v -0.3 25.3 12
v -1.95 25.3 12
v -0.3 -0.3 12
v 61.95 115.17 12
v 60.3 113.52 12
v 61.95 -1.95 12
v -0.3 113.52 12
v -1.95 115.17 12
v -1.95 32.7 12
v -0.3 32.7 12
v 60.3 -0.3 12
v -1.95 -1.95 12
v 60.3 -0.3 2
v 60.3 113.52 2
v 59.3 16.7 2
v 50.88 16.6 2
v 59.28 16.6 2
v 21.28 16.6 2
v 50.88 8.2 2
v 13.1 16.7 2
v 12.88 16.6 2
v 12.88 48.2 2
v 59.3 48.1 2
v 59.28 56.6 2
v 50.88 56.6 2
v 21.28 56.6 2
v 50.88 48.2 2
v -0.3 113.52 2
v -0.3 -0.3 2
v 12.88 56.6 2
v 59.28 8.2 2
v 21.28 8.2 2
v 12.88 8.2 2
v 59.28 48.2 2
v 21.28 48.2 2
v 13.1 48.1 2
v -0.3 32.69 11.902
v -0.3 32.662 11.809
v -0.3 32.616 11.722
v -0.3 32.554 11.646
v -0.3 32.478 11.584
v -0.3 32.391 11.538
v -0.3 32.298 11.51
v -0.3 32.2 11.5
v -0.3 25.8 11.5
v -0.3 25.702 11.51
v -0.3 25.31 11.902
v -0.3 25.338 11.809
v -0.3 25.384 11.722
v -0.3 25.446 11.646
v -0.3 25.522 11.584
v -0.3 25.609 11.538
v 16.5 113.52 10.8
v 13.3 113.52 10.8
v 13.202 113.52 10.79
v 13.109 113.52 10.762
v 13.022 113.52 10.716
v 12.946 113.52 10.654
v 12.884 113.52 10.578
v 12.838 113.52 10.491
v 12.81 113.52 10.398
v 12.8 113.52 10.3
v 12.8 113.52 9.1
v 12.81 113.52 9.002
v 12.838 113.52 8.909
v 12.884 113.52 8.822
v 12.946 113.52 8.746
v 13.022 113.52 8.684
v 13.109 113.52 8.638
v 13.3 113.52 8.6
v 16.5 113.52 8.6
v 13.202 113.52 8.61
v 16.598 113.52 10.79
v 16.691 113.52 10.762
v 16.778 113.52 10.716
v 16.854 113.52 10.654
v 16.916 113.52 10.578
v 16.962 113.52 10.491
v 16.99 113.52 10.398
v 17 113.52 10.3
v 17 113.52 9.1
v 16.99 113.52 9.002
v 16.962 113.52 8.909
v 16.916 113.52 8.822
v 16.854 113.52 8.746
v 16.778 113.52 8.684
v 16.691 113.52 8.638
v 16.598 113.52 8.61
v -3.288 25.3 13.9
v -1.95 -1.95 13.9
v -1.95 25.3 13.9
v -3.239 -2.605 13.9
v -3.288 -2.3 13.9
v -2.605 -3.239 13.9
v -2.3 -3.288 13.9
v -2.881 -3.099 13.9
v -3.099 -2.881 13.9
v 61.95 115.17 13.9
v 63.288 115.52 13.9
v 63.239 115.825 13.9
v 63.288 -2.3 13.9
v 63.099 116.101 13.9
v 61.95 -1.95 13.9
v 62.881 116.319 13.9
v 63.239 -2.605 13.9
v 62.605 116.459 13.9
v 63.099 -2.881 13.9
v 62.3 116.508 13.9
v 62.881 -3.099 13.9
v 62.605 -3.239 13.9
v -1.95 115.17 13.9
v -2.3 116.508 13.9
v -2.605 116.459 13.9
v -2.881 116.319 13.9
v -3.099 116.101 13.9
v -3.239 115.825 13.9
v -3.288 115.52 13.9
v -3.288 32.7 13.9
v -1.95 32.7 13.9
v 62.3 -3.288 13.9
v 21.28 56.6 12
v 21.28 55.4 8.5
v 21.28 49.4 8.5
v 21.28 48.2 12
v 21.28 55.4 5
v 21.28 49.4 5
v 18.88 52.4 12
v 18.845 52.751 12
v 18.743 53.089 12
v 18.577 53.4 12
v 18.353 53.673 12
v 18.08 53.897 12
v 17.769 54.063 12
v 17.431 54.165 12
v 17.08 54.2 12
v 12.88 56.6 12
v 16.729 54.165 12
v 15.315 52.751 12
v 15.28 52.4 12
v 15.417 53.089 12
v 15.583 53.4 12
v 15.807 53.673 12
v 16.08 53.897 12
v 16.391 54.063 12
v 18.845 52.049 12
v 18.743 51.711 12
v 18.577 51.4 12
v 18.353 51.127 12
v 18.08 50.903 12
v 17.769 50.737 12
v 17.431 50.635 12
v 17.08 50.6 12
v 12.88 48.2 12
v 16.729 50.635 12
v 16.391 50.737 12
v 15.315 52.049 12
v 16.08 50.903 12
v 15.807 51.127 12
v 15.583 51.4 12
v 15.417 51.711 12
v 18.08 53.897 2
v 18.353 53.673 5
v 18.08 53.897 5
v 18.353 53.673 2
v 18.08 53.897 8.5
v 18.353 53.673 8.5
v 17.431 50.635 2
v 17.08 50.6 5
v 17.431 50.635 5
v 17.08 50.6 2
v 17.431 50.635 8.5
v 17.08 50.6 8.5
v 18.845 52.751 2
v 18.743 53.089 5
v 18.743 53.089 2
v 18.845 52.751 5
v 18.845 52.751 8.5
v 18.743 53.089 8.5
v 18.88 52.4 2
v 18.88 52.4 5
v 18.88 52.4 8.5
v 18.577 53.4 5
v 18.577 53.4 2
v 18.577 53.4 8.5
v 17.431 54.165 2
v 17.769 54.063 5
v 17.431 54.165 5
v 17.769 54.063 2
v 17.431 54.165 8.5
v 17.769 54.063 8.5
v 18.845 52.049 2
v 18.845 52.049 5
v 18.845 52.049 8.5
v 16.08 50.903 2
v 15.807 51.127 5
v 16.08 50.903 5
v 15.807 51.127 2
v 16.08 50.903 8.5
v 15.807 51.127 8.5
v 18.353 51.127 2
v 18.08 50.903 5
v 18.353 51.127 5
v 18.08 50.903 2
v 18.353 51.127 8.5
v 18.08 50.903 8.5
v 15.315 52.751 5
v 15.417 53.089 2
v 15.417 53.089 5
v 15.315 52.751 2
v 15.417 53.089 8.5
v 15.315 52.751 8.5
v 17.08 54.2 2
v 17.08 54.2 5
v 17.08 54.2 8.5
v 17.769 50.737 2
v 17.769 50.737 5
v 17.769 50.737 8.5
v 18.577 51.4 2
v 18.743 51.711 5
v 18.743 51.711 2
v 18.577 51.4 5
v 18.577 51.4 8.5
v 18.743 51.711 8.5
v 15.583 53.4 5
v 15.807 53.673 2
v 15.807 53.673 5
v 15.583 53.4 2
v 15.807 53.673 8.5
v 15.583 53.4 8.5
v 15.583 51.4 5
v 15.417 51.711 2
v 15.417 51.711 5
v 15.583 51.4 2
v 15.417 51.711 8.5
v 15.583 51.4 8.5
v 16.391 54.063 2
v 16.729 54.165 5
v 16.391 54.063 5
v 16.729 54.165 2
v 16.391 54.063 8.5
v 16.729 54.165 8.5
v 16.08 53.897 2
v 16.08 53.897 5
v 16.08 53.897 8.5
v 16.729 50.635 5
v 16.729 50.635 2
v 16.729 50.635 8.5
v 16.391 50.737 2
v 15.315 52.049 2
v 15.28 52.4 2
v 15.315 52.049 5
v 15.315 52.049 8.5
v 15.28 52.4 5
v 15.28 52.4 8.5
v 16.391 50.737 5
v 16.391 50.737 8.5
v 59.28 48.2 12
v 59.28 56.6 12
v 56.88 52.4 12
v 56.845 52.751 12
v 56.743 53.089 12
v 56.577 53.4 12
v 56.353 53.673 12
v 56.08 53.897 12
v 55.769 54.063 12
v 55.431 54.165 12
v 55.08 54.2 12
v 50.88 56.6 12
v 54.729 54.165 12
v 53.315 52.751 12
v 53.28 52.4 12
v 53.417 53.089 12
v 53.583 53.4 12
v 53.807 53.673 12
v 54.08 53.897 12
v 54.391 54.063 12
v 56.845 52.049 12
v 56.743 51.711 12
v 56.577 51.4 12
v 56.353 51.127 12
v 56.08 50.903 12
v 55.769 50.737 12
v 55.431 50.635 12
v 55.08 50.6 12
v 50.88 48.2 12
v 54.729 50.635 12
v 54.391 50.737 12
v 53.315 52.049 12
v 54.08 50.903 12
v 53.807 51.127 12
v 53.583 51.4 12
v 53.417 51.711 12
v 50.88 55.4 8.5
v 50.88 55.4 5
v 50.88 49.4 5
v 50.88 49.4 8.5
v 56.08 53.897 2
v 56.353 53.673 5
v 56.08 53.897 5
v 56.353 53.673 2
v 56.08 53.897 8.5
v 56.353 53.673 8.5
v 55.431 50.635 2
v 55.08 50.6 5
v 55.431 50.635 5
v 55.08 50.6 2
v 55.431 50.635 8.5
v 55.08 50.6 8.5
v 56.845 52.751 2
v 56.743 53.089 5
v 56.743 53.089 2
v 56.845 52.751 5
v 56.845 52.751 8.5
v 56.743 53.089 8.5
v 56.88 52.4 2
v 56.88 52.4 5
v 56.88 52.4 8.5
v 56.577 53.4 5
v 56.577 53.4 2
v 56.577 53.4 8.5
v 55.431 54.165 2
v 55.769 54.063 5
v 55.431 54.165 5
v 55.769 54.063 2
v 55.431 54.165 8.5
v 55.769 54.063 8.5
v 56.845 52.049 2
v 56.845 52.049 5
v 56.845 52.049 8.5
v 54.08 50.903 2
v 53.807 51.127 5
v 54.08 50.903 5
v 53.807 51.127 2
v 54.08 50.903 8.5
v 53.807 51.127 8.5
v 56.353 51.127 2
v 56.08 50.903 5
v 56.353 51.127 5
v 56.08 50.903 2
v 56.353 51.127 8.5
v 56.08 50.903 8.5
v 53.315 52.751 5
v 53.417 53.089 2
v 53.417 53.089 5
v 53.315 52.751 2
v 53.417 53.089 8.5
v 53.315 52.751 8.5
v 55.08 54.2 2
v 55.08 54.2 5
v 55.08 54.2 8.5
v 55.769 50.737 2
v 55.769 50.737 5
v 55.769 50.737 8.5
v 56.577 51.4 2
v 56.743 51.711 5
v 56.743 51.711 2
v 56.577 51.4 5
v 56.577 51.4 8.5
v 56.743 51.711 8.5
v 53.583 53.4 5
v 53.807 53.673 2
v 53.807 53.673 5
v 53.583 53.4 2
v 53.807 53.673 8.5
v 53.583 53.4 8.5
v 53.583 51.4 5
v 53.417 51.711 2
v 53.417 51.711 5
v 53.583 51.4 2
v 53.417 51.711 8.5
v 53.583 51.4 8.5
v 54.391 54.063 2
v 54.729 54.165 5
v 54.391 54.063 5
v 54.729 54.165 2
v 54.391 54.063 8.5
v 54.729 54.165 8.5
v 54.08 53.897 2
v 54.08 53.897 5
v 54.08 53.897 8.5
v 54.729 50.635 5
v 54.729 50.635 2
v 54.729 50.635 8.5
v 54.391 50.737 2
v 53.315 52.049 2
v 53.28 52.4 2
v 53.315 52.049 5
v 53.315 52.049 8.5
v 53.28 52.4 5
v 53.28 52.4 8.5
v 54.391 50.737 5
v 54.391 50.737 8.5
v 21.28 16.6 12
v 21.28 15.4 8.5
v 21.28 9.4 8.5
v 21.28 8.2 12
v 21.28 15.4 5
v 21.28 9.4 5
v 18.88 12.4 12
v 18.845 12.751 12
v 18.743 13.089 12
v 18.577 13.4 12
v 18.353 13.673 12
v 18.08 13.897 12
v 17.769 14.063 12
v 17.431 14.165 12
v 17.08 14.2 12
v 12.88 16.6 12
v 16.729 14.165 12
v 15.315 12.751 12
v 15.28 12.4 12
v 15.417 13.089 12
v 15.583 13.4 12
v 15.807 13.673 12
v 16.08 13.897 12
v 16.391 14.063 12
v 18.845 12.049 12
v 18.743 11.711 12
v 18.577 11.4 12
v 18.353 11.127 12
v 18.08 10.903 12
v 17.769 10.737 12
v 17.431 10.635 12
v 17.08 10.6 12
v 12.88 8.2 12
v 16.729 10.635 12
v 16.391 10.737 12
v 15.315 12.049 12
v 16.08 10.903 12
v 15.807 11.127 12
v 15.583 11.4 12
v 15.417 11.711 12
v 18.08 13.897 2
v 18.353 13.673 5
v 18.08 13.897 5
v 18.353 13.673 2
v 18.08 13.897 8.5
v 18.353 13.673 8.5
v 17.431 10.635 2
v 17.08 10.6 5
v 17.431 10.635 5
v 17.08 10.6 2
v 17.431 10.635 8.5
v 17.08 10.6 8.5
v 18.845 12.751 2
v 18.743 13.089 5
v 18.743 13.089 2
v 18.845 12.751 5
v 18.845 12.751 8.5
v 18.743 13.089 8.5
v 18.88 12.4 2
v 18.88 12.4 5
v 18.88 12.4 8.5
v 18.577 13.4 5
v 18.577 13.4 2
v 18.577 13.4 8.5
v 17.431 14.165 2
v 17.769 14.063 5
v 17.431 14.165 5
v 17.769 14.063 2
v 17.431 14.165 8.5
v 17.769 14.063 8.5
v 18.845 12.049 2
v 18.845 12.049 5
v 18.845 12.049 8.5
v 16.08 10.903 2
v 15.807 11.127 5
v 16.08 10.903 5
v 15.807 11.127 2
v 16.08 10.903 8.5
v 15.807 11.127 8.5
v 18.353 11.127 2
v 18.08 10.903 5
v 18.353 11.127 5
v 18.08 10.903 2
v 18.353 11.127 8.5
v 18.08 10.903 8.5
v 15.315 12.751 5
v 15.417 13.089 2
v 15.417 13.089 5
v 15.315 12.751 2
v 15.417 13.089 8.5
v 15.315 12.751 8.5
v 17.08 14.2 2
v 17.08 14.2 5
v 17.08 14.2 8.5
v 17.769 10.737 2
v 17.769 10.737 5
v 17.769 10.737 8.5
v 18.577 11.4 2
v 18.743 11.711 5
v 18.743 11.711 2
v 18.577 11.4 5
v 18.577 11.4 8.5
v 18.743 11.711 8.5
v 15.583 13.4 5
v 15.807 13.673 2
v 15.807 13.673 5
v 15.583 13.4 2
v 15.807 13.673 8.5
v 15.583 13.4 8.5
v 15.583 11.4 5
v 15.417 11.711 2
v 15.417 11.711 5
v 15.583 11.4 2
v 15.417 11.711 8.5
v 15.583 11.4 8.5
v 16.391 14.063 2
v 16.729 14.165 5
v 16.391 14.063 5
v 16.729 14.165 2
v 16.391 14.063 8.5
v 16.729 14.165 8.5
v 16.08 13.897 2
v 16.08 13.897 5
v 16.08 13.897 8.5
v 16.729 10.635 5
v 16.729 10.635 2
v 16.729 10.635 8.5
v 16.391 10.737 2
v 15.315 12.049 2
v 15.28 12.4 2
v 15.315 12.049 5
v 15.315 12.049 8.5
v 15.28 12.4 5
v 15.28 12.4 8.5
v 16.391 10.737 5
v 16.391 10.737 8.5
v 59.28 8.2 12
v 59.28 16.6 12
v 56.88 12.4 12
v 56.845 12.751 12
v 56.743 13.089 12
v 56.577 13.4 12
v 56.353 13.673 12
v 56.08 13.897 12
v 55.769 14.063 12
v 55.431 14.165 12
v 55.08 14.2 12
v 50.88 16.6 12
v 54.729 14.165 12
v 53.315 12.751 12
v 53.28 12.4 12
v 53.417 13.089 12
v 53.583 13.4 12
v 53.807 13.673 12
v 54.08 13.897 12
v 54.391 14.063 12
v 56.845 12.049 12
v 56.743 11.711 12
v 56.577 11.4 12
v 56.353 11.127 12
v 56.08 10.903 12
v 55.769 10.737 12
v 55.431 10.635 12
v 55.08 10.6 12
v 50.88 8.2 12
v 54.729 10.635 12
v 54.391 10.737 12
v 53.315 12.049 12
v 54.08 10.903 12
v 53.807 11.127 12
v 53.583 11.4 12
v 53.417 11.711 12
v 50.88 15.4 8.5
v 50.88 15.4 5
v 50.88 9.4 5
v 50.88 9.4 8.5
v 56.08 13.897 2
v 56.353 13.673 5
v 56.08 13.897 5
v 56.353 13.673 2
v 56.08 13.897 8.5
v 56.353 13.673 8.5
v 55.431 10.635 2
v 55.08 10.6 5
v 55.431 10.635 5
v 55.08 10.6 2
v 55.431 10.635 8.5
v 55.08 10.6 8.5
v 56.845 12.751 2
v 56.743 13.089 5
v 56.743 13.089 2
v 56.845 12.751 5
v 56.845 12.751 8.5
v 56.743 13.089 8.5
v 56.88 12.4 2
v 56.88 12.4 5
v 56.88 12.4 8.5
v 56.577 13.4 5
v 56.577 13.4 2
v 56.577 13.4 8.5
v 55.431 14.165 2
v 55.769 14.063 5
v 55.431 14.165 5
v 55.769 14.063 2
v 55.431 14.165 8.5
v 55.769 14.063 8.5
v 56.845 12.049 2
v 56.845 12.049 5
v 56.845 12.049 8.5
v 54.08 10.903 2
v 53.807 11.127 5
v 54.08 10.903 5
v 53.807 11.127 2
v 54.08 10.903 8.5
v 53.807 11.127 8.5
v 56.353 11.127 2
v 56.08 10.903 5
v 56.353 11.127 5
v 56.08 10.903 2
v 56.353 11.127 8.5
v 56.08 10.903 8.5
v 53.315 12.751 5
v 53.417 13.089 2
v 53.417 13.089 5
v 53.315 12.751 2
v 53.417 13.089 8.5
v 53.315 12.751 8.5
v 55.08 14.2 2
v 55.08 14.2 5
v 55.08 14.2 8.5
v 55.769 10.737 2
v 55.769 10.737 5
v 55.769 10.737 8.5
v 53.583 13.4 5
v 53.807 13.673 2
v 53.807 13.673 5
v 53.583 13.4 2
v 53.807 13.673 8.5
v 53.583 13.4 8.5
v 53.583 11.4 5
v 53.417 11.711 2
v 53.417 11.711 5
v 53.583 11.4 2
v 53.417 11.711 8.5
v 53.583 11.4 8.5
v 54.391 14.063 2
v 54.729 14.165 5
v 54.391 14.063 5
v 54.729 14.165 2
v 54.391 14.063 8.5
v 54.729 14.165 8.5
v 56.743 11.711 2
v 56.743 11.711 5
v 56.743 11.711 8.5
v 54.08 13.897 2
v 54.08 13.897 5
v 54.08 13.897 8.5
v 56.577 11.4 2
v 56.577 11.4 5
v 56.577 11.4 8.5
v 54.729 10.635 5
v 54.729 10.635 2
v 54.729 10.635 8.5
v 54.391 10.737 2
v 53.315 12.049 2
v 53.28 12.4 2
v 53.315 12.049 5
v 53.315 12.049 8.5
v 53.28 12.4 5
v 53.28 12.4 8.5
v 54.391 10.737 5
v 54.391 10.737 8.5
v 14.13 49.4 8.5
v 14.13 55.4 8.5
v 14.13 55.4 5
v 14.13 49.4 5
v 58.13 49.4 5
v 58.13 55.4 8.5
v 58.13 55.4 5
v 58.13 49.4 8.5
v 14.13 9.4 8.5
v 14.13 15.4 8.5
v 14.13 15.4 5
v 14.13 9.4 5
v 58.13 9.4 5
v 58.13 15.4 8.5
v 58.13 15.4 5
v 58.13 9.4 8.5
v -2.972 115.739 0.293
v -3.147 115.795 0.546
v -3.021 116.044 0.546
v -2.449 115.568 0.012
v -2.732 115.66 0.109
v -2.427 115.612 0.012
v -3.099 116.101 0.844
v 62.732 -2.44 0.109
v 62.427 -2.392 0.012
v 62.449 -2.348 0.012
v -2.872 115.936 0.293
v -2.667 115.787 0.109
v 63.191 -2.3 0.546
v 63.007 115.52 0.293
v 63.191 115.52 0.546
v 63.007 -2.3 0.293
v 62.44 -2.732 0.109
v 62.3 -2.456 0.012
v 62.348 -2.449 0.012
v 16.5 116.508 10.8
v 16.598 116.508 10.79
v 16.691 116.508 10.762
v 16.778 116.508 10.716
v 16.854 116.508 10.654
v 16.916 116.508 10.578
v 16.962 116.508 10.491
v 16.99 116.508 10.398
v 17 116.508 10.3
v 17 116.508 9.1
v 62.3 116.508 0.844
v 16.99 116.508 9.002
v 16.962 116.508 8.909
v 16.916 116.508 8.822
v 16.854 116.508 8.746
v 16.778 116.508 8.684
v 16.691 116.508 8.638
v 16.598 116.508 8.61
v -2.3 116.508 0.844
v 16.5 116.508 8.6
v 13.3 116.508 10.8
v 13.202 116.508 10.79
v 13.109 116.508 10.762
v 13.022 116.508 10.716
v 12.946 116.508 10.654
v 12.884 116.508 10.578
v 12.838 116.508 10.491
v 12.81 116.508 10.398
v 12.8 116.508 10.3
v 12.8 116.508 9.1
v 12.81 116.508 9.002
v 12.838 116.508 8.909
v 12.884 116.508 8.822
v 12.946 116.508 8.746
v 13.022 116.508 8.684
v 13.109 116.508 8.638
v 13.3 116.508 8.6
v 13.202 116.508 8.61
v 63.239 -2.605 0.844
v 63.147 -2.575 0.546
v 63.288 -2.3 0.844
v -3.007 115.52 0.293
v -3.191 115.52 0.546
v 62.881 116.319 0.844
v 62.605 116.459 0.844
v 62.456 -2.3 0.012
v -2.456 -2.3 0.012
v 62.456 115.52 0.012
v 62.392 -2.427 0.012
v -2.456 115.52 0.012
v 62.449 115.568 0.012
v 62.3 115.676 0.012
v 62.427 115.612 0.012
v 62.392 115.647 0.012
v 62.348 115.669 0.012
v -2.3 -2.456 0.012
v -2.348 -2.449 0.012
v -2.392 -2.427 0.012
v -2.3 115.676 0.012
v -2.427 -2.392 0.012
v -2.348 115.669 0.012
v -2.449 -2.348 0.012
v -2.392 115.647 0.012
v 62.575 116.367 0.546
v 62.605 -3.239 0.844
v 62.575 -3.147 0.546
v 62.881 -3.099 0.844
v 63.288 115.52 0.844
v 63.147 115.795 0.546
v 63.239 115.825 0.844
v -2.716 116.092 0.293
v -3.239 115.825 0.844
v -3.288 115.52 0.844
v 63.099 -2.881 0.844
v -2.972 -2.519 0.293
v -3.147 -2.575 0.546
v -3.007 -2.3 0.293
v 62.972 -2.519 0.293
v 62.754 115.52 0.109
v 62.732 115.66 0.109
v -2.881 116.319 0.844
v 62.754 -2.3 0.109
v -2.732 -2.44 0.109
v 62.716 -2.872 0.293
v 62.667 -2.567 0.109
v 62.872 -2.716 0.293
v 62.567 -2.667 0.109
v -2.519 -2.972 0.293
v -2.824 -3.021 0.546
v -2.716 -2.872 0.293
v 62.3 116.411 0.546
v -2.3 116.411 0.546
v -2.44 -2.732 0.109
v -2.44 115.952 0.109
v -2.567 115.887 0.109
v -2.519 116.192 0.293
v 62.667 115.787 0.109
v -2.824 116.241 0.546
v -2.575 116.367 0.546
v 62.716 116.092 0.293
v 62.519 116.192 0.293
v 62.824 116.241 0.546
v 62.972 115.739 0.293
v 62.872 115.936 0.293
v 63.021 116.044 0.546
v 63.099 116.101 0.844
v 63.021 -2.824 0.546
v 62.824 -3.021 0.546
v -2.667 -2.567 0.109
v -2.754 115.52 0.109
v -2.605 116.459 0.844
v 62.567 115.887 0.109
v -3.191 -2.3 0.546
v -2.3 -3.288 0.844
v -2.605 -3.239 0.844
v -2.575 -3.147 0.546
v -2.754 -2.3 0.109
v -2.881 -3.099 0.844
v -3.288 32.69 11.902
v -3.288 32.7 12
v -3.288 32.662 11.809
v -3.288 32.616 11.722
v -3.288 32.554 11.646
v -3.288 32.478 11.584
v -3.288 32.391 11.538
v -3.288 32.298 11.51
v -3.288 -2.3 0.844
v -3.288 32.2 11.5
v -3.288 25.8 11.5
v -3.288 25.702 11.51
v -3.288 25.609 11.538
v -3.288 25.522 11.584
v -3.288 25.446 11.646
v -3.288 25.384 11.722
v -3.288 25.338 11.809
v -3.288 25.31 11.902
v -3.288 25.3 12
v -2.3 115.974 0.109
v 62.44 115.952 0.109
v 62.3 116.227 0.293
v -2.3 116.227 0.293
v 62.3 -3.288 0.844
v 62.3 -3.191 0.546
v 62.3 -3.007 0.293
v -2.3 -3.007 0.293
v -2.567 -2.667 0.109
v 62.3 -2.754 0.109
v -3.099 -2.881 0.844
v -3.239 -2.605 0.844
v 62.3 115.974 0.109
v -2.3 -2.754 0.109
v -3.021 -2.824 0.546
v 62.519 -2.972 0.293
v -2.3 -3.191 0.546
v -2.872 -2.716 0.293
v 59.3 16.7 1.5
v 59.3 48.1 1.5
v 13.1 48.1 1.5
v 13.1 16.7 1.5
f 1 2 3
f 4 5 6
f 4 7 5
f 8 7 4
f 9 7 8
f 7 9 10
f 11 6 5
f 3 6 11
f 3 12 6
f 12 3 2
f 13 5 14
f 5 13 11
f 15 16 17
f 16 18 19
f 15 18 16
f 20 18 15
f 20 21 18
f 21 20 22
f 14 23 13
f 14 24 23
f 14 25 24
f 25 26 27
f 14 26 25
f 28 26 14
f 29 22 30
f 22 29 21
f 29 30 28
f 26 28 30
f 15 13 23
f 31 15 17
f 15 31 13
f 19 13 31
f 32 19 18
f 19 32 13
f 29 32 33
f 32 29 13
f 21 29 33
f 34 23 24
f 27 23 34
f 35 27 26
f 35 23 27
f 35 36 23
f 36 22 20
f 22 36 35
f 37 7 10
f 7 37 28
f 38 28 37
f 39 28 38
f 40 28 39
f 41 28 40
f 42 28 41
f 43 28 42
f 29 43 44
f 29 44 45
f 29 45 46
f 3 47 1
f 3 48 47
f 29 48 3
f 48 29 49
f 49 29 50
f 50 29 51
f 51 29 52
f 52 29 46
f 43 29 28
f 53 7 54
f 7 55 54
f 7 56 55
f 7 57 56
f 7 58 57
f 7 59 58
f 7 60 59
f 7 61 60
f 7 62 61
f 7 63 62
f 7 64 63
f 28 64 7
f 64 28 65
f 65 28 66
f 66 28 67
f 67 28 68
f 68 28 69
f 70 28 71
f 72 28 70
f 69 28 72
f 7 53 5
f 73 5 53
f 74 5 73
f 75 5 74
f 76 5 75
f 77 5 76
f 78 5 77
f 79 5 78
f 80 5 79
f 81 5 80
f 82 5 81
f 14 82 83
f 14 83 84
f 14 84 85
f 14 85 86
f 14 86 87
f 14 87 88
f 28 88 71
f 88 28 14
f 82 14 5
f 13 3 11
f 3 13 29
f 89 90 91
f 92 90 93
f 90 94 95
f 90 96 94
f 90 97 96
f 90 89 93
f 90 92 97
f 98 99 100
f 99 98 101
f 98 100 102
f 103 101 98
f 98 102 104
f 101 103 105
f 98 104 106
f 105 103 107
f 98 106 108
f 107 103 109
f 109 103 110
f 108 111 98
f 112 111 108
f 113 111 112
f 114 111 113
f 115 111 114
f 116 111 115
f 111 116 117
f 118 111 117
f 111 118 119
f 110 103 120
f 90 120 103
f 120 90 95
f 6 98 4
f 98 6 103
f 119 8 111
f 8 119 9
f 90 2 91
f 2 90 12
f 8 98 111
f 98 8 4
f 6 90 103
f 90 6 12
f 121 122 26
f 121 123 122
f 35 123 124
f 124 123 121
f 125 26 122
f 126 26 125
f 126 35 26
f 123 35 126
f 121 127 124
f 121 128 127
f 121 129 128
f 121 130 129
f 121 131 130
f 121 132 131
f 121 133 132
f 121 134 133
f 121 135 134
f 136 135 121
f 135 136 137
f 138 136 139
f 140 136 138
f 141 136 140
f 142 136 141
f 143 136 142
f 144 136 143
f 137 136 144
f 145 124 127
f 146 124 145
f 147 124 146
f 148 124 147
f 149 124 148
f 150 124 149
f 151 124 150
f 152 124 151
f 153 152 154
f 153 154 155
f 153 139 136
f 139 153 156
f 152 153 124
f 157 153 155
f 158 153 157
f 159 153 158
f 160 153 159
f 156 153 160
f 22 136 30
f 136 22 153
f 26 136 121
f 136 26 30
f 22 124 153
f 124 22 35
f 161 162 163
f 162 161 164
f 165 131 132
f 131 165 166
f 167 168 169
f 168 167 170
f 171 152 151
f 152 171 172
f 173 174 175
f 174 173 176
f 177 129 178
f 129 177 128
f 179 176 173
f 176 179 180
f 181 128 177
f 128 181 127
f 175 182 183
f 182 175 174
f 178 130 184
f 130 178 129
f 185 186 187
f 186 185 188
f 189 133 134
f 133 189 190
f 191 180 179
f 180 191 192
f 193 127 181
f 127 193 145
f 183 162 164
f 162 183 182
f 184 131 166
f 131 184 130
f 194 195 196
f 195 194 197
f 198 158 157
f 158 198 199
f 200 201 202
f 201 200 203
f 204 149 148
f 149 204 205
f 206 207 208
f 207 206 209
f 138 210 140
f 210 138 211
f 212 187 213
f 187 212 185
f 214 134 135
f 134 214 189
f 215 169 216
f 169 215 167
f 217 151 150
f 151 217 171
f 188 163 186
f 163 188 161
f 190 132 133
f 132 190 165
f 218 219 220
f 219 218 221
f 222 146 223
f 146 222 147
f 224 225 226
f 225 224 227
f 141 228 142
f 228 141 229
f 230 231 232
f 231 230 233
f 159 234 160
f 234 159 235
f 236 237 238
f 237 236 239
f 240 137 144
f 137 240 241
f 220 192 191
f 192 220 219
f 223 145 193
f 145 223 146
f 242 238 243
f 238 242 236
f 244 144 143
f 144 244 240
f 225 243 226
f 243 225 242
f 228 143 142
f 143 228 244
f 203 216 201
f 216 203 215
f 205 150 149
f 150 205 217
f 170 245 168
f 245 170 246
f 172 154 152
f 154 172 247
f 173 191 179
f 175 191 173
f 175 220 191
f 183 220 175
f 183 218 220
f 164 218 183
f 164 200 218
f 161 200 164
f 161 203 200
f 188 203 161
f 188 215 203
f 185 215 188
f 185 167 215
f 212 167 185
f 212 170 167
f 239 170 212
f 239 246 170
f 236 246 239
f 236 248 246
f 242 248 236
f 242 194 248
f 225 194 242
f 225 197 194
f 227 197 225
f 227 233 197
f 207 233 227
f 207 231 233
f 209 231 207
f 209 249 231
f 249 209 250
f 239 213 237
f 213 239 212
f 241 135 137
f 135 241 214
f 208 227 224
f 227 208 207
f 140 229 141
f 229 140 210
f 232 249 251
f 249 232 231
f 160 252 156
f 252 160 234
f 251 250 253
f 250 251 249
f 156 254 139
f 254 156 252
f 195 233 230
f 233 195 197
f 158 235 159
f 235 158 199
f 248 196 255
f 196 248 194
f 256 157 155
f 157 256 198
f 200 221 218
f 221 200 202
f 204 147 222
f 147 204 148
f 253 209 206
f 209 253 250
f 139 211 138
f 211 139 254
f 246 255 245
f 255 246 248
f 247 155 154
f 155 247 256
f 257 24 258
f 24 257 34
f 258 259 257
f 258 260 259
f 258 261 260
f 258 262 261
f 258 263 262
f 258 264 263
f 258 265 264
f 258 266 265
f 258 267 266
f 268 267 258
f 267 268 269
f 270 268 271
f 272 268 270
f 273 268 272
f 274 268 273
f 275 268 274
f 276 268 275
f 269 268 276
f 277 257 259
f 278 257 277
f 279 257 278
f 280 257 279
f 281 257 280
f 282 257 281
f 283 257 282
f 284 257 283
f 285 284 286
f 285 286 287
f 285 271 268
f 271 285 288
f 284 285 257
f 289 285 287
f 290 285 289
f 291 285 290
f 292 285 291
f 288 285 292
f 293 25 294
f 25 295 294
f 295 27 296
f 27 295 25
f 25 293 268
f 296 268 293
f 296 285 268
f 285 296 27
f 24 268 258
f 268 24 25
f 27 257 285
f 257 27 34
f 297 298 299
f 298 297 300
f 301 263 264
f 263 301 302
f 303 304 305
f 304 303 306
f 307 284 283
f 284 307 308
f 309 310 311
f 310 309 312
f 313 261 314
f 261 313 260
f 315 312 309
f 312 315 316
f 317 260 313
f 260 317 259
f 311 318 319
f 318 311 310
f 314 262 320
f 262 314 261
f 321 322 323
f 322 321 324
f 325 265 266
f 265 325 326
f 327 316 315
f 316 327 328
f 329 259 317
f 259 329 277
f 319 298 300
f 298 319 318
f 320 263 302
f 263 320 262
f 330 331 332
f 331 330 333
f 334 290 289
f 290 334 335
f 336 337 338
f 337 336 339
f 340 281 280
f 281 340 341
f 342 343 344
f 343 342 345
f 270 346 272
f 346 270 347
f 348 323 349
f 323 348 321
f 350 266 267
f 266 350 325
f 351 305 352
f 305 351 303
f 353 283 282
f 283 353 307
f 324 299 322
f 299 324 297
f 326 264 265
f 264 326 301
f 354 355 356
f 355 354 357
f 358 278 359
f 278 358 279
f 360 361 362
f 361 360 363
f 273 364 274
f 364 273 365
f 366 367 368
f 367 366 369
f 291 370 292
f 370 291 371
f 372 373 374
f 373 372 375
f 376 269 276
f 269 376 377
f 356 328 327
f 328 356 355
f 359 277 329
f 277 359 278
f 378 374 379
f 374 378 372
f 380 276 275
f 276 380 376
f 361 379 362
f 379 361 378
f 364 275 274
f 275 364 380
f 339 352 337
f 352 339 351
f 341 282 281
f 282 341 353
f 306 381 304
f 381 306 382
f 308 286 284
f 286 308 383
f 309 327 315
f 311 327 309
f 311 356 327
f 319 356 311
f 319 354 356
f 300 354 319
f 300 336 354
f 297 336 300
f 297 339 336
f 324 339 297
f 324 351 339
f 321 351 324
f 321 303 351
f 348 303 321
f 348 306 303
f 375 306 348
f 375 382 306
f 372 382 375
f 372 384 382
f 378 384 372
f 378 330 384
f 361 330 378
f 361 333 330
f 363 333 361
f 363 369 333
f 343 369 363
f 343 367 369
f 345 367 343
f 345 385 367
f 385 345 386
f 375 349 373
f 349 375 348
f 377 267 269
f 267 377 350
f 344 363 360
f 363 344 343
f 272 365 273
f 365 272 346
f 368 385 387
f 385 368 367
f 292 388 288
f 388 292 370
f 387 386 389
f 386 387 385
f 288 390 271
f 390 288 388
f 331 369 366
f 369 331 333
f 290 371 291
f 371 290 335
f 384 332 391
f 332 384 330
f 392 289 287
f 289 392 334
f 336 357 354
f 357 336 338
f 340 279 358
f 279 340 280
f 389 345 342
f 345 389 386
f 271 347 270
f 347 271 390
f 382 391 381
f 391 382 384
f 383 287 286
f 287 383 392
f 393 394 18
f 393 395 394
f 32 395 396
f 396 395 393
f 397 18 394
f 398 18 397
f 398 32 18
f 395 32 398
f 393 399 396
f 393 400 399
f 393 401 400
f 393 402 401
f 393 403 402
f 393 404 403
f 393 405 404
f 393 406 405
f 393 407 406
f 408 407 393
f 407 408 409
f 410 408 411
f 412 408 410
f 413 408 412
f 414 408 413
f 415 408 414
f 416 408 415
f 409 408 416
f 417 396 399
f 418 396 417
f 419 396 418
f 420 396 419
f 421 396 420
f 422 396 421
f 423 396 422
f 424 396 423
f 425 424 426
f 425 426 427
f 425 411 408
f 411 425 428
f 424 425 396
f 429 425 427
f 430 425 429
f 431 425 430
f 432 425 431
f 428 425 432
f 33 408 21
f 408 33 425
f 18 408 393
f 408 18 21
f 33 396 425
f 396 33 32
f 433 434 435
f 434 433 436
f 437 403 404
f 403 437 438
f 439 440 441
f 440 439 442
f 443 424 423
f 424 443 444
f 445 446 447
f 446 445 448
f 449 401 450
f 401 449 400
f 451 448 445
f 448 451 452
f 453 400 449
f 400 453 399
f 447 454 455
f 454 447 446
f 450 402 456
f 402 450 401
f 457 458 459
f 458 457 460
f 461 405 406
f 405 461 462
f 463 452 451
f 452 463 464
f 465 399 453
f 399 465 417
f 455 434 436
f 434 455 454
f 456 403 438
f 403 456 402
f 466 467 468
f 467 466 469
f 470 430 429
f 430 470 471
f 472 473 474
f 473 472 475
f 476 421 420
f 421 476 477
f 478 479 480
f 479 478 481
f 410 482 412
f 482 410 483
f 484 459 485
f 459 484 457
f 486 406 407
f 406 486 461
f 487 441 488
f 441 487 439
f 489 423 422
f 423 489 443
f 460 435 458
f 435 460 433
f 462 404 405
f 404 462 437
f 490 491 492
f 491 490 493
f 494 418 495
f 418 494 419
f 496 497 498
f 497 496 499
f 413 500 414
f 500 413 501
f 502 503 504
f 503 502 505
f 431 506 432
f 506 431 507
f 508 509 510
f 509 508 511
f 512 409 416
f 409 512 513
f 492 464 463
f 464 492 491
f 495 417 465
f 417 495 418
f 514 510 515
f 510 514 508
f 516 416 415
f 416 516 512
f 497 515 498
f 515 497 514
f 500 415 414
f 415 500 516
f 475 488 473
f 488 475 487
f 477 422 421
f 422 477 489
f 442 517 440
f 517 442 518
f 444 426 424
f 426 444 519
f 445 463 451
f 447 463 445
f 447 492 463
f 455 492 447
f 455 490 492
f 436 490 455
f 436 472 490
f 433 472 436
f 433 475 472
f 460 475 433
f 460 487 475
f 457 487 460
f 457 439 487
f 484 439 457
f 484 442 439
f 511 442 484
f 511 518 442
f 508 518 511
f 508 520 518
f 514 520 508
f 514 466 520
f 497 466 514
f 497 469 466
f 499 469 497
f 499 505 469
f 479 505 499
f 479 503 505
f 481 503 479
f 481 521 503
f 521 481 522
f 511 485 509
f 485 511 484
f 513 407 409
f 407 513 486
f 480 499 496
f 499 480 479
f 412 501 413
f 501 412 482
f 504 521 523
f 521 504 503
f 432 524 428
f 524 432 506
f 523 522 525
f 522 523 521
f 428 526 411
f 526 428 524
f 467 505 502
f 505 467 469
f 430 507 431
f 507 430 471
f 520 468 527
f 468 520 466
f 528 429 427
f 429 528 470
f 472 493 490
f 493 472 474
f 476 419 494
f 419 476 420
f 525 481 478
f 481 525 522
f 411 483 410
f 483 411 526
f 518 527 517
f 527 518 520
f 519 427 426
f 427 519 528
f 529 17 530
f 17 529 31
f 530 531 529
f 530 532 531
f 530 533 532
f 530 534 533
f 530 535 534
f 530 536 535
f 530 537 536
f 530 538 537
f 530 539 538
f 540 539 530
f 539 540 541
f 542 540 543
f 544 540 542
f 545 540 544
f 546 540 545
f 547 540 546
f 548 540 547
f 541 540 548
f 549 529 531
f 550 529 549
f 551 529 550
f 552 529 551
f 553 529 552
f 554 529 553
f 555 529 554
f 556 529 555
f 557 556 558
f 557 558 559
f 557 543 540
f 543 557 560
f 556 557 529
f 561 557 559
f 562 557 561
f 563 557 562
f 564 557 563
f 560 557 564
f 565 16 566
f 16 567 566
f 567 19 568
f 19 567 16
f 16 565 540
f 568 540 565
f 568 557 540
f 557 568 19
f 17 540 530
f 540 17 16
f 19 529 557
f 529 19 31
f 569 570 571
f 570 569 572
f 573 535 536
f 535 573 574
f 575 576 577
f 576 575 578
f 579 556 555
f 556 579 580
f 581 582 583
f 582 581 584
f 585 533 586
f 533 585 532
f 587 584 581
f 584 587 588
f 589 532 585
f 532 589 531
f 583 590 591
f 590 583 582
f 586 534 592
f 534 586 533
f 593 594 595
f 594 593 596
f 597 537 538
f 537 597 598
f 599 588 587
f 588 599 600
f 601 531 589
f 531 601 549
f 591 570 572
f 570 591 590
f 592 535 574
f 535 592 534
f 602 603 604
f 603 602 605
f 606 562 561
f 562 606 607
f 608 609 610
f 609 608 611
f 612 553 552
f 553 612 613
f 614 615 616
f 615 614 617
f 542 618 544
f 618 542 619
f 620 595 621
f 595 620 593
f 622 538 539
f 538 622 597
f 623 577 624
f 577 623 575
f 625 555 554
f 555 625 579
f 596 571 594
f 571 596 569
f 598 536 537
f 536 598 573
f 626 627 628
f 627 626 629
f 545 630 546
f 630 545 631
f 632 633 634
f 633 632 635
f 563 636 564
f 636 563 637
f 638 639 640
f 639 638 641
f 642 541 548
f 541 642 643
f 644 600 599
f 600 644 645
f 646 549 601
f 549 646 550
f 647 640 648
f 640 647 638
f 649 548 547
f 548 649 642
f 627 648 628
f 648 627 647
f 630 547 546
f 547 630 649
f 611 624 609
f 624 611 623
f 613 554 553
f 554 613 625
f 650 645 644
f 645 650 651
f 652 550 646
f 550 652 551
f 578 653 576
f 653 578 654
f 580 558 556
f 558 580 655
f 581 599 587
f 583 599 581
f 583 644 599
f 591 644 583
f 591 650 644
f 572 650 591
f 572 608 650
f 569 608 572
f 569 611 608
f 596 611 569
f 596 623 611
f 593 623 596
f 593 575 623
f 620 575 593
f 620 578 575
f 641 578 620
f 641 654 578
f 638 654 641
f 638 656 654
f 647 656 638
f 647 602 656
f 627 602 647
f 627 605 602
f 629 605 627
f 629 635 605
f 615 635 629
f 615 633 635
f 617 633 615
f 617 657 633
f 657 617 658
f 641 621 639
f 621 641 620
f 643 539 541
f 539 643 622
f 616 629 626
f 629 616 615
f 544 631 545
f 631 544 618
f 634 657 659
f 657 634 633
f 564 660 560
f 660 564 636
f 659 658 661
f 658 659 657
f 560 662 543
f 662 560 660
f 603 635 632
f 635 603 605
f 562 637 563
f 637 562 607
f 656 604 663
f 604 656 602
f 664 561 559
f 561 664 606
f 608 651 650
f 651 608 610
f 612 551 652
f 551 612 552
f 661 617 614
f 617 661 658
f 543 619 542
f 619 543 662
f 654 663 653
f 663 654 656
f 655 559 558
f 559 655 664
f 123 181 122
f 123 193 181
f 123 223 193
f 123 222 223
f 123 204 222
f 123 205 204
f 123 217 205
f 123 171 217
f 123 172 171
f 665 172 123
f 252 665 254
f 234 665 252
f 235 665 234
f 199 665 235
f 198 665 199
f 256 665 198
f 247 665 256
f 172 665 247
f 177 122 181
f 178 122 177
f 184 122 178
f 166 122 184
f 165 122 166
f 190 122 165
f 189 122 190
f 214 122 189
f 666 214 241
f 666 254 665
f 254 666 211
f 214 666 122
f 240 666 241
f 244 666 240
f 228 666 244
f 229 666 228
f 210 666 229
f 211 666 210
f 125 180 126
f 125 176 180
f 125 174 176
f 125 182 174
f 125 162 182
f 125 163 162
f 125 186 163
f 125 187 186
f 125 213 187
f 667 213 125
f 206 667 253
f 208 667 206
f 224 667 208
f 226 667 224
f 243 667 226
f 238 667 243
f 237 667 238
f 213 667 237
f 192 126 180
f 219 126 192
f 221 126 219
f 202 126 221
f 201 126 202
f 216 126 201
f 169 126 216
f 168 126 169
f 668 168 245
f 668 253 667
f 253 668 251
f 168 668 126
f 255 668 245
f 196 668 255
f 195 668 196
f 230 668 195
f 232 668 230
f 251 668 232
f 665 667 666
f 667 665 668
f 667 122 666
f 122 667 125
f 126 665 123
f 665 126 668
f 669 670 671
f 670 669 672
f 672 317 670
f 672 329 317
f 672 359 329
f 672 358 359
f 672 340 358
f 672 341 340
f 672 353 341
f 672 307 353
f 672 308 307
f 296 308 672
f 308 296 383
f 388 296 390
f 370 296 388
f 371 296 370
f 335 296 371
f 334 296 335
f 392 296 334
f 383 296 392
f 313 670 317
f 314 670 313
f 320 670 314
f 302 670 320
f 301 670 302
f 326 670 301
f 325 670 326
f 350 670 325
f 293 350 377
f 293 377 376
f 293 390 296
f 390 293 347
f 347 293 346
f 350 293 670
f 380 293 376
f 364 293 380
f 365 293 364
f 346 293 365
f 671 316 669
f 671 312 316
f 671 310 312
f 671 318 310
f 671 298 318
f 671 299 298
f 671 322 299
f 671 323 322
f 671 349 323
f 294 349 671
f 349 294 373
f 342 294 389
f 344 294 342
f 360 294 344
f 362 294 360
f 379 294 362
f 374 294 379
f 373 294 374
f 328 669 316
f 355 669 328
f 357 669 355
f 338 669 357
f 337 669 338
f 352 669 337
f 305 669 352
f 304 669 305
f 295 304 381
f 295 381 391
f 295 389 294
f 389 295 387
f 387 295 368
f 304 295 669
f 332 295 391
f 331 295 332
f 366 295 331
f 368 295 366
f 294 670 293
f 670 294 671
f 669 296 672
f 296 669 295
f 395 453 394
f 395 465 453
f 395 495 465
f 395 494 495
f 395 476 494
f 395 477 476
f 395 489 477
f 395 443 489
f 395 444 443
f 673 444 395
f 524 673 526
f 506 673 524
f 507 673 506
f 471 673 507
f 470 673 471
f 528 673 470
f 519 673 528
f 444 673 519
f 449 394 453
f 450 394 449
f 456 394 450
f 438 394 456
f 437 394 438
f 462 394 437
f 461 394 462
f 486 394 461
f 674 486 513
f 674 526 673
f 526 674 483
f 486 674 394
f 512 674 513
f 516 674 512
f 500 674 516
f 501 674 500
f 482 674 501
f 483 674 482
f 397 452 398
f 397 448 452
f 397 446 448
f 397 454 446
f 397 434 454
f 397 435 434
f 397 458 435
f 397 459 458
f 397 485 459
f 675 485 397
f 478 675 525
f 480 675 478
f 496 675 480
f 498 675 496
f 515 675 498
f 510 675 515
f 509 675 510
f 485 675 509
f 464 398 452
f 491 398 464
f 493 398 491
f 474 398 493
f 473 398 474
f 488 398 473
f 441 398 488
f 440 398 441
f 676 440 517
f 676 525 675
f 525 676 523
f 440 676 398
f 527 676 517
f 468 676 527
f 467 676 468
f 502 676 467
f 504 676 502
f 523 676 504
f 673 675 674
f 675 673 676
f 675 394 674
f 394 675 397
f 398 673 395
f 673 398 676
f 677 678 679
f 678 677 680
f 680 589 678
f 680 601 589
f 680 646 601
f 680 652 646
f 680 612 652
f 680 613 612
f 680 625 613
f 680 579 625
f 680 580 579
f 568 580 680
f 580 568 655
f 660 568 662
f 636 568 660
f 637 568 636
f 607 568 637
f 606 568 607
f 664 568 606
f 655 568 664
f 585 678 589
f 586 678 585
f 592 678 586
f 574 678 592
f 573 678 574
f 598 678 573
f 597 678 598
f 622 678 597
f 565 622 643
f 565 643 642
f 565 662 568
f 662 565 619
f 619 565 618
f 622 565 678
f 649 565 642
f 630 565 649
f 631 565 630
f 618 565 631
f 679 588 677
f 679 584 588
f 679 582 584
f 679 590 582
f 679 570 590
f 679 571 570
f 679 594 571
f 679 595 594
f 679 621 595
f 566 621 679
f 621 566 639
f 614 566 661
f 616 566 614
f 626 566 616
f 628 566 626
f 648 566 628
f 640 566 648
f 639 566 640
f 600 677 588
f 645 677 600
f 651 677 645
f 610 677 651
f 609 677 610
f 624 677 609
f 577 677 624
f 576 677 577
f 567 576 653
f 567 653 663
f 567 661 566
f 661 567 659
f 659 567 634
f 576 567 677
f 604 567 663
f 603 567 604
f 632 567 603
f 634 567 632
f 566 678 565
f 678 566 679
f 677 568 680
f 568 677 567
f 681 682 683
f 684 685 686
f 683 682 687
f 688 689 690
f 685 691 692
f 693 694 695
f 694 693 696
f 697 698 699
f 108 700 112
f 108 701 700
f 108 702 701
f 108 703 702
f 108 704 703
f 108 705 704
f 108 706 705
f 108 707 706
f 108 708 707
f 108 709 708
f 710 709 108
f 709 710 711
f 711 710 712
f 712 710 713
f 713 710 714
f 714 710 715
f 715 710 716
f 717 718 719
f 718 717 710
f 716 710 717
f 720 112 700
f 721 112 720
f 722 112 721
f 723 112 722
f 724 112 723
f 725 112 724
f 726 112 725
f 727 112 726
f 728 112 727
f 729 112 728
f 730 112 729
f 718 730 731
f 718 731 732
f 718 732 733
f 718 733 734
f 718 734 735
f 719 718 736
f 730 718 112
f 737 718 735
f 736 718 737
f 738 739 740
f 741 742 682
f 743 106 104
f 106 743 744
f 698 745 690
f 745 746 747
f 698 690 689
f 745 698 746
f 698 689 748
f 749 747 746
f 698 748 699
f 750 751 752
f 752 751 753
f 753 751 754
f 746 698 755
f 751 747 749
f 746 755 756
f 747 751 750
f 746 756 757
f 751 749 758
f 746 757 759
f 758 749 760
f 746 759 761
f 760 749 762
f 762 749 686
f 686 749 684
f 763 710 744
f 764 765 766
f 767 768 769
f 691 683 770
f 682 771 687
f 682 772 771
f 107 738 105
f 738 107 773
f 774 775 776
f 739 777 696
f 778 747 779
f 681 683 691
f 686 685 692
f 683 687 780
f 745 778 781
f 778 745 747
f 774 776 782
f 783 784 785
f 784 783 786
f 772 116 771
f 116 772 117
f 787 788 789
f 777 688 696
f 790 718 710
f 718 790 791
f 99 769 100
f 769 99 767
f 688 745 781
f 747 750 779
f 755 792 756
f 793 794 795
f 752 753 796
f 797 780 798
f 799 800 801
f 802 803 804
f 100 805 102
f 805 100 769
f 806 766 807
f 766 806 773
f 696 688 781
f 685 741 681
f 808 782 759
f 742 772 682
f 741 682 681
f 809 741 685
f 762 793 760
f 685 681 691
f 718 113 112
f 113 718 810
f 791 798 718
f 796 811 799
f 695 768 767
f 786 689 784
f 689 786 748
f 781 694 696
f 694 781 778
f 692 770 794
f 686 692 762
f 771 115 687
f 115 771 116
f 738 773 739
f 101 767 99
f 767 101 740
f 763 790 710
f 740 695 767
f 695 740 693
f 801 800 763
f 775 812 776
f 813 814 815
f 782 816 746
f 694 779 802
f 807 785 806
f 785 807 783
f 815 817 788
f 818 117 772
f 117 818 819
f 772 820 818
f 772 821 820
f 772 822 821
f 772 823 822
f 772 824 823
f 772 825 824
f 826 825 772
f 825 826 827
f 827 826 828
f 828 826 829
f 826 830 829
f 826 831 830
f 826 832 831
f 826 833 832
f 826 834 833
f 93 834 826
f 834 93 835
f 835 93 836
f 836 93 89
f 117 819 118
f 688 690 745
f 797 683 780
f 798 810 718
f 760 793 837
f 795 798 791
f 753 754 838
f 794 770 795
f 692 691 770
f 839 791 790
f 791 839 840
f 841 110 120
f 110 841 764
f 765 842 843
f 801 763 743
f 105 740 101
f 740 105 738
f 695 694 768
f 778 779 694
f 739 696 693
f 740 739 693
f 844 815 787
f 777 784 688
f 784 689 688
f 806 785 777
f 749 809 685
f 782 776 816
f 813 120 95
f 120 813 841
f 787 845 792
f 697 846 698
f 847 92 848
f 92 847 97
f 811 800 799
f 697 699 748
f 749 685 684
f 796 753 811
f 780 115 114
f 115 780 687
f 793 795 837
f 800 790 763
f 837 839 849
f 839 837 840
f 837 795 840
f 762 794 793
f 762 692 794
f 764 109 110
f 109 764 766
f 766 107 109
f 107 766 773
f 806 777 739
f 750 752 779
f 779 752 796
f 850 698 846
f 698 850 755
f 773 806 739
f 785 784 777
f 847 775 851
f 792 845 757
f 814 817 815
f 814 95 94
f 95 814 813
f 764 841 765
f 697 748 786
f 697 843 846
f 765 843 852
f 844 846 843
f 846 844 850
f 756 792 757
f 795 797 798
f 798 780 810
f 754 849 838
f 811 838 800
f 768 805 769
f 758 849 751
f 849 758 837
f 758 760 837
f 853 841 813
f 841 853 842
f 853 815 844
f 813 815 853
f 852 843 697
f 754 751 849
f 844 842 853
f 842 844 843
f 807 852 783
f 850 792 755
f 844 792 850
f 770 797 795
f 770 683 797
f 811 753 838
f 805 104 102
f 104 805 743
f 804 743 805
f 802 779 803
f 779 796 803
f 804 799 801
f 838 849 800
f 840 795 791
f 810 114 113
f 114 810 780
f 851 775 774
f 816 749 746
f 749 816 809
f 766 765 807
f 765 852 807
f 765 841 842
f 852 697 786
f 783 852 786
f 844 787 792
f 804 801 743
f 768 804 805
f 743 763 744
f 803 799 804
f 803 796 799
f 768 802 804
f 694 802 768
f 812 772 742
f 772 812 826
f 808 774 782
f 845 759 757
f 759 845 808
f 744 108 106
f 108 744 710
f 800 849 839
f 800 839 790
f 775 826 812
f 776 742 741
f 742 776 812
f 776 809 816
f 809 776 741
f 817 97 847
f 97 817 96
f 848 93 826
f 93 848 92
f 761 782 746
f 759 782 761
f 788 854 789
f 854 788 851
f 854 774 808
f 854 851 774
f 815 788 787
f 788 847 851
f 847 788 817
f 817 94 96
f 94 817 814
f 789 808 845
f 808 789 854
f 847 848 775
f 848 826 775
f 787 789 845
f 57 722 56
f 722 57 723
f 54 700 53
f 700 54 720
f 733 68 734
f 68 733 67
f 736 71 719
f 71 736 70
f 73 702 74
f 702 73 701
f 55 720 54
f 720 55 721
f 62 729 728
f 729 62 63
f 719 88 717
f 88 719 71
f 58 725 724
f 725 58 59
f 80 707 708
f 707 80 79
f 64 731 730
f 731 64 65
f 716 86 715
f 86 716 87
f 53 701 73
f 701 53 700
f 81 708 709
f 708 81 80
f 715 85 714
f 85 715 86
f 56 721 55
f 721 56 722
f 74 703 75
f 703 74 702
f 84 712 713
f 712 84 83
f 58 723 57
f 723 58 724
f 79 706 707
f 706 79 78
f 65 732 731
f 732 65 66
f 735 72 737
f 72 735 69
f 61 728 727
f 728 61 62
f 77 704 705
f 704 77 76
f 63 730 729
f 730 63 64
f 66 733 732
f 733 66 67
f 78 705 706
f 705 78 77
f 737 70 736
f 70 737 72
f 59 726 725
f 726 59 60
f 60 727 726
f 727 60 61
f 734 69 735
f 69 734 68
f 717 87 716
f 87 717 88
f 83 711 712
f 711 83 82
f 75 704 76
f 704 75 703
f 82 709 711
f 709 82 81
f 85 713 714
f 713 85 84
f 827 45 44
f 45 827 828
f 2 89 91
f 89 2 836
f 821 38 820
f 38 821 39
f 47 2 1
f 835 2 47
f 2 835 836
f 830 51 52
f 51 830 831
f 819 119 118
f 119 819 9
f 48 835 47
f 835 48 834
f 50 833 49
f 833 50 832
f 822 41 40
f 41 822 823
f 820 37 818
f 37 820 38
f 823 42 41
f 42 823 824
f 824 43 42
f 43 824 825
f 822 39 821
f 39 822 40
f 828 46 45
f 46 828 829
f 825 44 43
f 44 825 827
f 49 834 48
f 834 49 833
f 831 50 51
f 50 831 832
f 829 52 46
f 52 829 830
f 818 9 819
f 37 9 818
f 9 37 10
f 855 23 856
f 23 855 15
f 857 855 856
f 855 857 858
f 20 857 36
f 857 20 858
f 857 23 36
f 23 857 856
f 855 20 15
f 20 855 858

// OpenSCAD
difference() {
  difference() {
    difference() {
      difference() {
        difference() {
          intersection() {
            difference() {
              difference() {
                difference() {
                  difference() {
                    difference() {
                      union() {
                        difference() {
                          union() {
                            difference() {
                              union() {
                                difference() {
                                  union() {
                                    difference() {
                                      translate(v=[-3.300, -3.300, 0.000]) {
                                      rotate([-180.000,-180.000,-180.000]){
                                        cube(size=[66.600, 119.820, 12.000], center=false);
                                      } // End rotate
                                      } // End translate
                                      translate(v=[-0.300, -0.300, 2.000]) {
                                      rotate([-180.000,-180.000,-180.000]){
                                        cube(size=[60.600, 113.820, 10.100], center=false);
                                      } // End rotate
                                      } // End translate
                                    } // End difference
                                    difference() {
                                      translate(v=[-3.300, -3.300, 11.900]) {
                                      rotate([-180.000,-180.000,-180.000]){
                                        cube(size=[66.600, 119.820, 2.000], center=false);
                                      } // End rotate
                                      } // End translate
                                      translate(v=[-1.950, -1.950, 11.800]) {
                                      rotate([-180.000,-180.000,-180.000]){
                                        cube(size=[63.900, 117.120, 2.200], center=false);
                                      } // End rotate
                                      } // End translate
                                    } // End difference
                                    translate(v=[12.880, 48.200, 0.000]) {
                                    rotate([-180.000,-180.000,-180.000]){
                                      cube(size=[8.400, 8.400, 12.000], center=false);
                                    } // End rotate
                                    } // End translate
                                  } // End union
                                  translate(v=[17.080, 52.400, 2.000]) {
                                  rotate([-180.000,-180.000,-180.000]){
                                    cylinder(h=10.100, r1=1.800, r2=1.800, $fn=32, center=false);
                                  } // End rotate
                                  } // End translate
                                } // End difference
                                translate(v=[50.880, 48.200, 0.000]) {
                                rotate([-180.000,-180.000,-180.000]){
                                  cube(size=[8.400, 8.400, 12.000], center=false);
                                } // End rotate
                                } // End translate
                              } // End union
                              translate(v=[55.080, 52.400, 2.000]) {
                              rotate([-180.000,-180.000,-180.000]){
                                cylinder(h=10.100, r1=1.800, r2=1.800, $fn=32, center=false);
                              } // End rotate
                              } // End translate
                            } // End difference
                            translate(v=[12.880, 8.200, 0.000]) {
                            rotate([-180.000,-180.000,-180.000]){
                              cube(size=[8.400, 8.400, 12.000], center=false);
                            } // End rotate
                            } // End translate
                          } // End union
                          translate(v=[17.080, 12.400, 2.000]) {
                          rotate([-180.000,-180.000,-180.000]){
                            cylinder(h=10.100, r1=1.800, r2=1.800, $fn=32, center=false);
                          } // End rotate
                          } // End translate
                        } // End difference
                        translate(v=[50.880, 8.200, 0.000]) {
                        rotate([-180.000,-180.000,-180.000]){
                          cube(size=[8.400, 8.400, 12.000], center=false);
                        } // End rotate
                        } // End translate
                      } // End union
                      translate(v=[55.080, 12.400, 2.000]) {
                      rotate([-180.000,-180.000,-180.000]){
                        cylinder(h=10.100, r1=1.800, r2=1.800, $fn=32, center=false);
                      } // End rotate
                      } // End translate
                    } // End difference
                    translate(v=[14.130, 49.400, 5.000]) {
                    rotate([-180.000,-180.000,-180.000]){
                      cube(size=[8.500, 6.000, 3.500], center=false);
                    } // End rotate
                    } // End translate
                  } // End difference
                  translate(v=[49.630, 49.400, 5.000]) {
                  rotate([-180.000,-180.000,-180.000]){
                    cube(size=[8.500, 6.000, 3.500], center=false);
                  } // End rotate
                  } // End translate
                } // End difference
                translate(v=[14.130, 9.400, 5.000]) {
                rotate([-180.000,-180.000,-180.000]){
                  cube(size=[8.500, 6.000, 3.500], center=false);
                } // End rotate
                } // End translate
              } // End difference
              translate(v=[49.630, 9.400, 5.000]) {
              rotate([-180.000,-180.000,-180.000]){
                cube(size=[8.500, 6.000, 3.500], center=false);
              } // End rotate
              } // End translate
            } // End difference
            hull() {
              translate(v=[62.300, 115.520, 31.600]) {
              rotate([-180.000,-180.000,-180.000]){
                sphere(r=1.000, $fn=20, center=true);
              } // End rotate
              } // End translate
              translate(v=[-2.300, 115.520, 31.600]) {
              rotate([-180.000,-180.000,-180.000]){
                sphere(r=1.000, $fn=20, center=true);
              } // End rotate
              } // End translate
              translate(v=[62.300, -2.300, 31.600]) {
              rotate([-180.000,-180.000,-180.000]){
                sphere(r=1.000, $fn=20, center=true);
              } // End rotate
              } // End translate
              translate(v=[-2.300, -2.300, 31.600]) {
              rotate([-180.000,-180.000,-180.000]){
                sphere(r=1.000, $fn=20, center=true);
              } // End rotate
              } // End translate
              translate(v=[62.300, 115.520, 1.000]) {
              rotate([-180.000,-180.000,-180.000]){
                sphere(r=1.000, $fn=20, center=true);
              } // End rotate
              } // End translate
              translate(v=[-2.300, 115.520, 1.000]) {
              rotate([-180.000,-180.000,-180.000]){
                sphere(r=1.000, $fn=20, center=true);
              } // End rotate
              } // End translate
              translate(v=[62.300, -2.300, 1.000]) {
              rotate([-180.000,-180.000,-180.000]){
                sphere(r=1.000, $fn=20, center=true);
              } // End rotate
              } // End translate
              translate(v=[-2.300, -2.300, 1.000]) {
              rotate([-180.000,-180.000,-180.000]){
                sphere(r=1.000, $fn=20, center=true);
              } // End rotate
              } // End translate
            } // End hull
          } // End intersection
          hull() {
            translate(v=[16.500, 113.120, 10.300]) {
            rotate([90.000,-180.000,-180.000]){
              cylinder(h=3.500, r1=0.500, r2=0.500, $fn=32, center=false);
            } // End rotate
            } // End translate
            translate(v=[13.300, 113.120, 10.300]) {
            rotate([90.000,-180.000,-180.000]){
              cylinder(h=3.500, r1=0.500, r2=0.500, $fn=32, center=false);
            } // End rotate
            } // End translate
            translate(v=[13.300, 113.120, 9.100]) {
            rotate([90.000,-180.000,-180.000]){
              cylinder(h=3.500, r1=0.500, r2=0.500, $fn=32, center=false);
            } // End rotate
            } // End translate
            translate(v=[16.500, 113.120, 9.100]) {
            rotate([90.000,-180.000,-180.000]){
              cylinder(h=3.500, r1=0.500, r2=0.500, $fn=32, center=false);
            } // End rotate
            } // End translate
          } // End hull
          hull() {
            translate(v=[16.500, 123.220, 10.300]) {
            rotate([90.000,-180.000,-180.000]){
              cylinder(h=-6.500, r1=0.500, r2=-6.000, $fn=32, center=false);
            } // End rotate
            } // End translate
            translate(v=[13.300, 123.220, 10.300]) {
            rotate([90.000,-180.000,-180.000]){
              cylinder(h=-6.500, r1=0.500, r2=-6.000, $fn=32, center=false);
            } // End rotate
            } // End translate
            translate(v=[13.300, 123.220, 9.100]) {
            rotate([90.000,-180.000,-180.000]){
              cylinder(h=-6.500, r1=0.500, r2=-6.000, $fn=32, center=false);
            } // End rotate
            } // End translate
            translate(v=[16.500, 123.220, 9.100]) {
            rotate([90.000,-180.000,-180.000]){
              cylinder(h=-6.500, r1=0.500, r2=-6.000, $fn=32, center=false);
            } // End rotate
            } // End translate
          } // End hull
        } // End difference
        hull() {
          translate(v=[0.100, 32.200, 12.000]) {
          rotate([90.000,-180.000,-90.000]){
            cylinder(h=3.500, r1=0.500, r2=0.500, $fn=32, center=false);
          } // End rotate
          } // End translate
          translate(v=[0.100, 25.800, 12.000]) {
          rotate([90.000,-180.000,-90.000]){
            cylinder(h=3.500, r1=0.500, r2=0.500, $fn=32, center=false);
          } // End rotate
          } // End translate
          translate(v=[0.100, 25.800, 15.200]) {
          rotate([90.000,-180.000,-90.000]){
            cylinder(h=3.500, r1=0.500, r2=0.500, $fn=32, center=false);
          } // End rotate
          } // End translate
          translate(v=[0.100, 32.200, 15.200]) {
          rotate([90.000,-180.000,-90.000]){
            cylinder(h=3.500, r1=0.500, r2=0.500, $fn=32, center=false);
          } // End rotate
          } // End translate
        } // End hull
        hull() {
          translate(v=[-10.000, 32.200, 12.000]) {
          rotate([90.000,-180.000,-90.000]){
            cylinder(h=-6.500, r1=0.500, r2=-6.000, $fn=32, center=false);
          } // End rotate
          } // End translate
          translate(v=[-10.000, 25.800, 12.000]) {
          rotate([90.000,-180.000,-90.000]){
            cylinder(h=-6.500, r1=0.500, r2=-6.000, $fn=32, center=false);
          } // End rotate
          } // End translate
          translate(v=[-10.000, 25.800, 15.200]) {
          rotate([90.000,-180.000,-90.000]){
            cylinder(h=-6.500, r1=0.500, r2=-6.000, $fn=32, center=false);
          } // End rotate
          } // End translate
          translate(v=[-10.000, 32.200, 15.200]) {
          rotate([90.000,-180.000,-90.000]){
            cylinder(h=-6.500, r1=0.500, r2=-6.000, $fn=32, center=false);
          } // End rotate
          } // End translate
        } // End hull
      } // End difference
      translate(v=[22.650, 55.570, 6.500]) {
      rotate([-180.000,-180.000,-180.000]){
        cube(size=[25.000, 13.150, 7.500], center=false);
      } // End rotate
      } // End translate
    } // End difference
    translate(v=[0.500, 29.000, 10.700]) {
    rotate([-180.000,-180.000,-180.000]){
      cube(size=[5.000, 6.400, 3.300], center=false);
    } // End rotate
    } // End translate
  } // End difference
  translate(v=[13.100, 16.700, 1.500]) {
  rotate([-180.000,-180.000,-180.000]){
    cube(size=[46.200, 31.400, 12.500], center=false);
  } // End rotate
  } // End translate
} // End difference
